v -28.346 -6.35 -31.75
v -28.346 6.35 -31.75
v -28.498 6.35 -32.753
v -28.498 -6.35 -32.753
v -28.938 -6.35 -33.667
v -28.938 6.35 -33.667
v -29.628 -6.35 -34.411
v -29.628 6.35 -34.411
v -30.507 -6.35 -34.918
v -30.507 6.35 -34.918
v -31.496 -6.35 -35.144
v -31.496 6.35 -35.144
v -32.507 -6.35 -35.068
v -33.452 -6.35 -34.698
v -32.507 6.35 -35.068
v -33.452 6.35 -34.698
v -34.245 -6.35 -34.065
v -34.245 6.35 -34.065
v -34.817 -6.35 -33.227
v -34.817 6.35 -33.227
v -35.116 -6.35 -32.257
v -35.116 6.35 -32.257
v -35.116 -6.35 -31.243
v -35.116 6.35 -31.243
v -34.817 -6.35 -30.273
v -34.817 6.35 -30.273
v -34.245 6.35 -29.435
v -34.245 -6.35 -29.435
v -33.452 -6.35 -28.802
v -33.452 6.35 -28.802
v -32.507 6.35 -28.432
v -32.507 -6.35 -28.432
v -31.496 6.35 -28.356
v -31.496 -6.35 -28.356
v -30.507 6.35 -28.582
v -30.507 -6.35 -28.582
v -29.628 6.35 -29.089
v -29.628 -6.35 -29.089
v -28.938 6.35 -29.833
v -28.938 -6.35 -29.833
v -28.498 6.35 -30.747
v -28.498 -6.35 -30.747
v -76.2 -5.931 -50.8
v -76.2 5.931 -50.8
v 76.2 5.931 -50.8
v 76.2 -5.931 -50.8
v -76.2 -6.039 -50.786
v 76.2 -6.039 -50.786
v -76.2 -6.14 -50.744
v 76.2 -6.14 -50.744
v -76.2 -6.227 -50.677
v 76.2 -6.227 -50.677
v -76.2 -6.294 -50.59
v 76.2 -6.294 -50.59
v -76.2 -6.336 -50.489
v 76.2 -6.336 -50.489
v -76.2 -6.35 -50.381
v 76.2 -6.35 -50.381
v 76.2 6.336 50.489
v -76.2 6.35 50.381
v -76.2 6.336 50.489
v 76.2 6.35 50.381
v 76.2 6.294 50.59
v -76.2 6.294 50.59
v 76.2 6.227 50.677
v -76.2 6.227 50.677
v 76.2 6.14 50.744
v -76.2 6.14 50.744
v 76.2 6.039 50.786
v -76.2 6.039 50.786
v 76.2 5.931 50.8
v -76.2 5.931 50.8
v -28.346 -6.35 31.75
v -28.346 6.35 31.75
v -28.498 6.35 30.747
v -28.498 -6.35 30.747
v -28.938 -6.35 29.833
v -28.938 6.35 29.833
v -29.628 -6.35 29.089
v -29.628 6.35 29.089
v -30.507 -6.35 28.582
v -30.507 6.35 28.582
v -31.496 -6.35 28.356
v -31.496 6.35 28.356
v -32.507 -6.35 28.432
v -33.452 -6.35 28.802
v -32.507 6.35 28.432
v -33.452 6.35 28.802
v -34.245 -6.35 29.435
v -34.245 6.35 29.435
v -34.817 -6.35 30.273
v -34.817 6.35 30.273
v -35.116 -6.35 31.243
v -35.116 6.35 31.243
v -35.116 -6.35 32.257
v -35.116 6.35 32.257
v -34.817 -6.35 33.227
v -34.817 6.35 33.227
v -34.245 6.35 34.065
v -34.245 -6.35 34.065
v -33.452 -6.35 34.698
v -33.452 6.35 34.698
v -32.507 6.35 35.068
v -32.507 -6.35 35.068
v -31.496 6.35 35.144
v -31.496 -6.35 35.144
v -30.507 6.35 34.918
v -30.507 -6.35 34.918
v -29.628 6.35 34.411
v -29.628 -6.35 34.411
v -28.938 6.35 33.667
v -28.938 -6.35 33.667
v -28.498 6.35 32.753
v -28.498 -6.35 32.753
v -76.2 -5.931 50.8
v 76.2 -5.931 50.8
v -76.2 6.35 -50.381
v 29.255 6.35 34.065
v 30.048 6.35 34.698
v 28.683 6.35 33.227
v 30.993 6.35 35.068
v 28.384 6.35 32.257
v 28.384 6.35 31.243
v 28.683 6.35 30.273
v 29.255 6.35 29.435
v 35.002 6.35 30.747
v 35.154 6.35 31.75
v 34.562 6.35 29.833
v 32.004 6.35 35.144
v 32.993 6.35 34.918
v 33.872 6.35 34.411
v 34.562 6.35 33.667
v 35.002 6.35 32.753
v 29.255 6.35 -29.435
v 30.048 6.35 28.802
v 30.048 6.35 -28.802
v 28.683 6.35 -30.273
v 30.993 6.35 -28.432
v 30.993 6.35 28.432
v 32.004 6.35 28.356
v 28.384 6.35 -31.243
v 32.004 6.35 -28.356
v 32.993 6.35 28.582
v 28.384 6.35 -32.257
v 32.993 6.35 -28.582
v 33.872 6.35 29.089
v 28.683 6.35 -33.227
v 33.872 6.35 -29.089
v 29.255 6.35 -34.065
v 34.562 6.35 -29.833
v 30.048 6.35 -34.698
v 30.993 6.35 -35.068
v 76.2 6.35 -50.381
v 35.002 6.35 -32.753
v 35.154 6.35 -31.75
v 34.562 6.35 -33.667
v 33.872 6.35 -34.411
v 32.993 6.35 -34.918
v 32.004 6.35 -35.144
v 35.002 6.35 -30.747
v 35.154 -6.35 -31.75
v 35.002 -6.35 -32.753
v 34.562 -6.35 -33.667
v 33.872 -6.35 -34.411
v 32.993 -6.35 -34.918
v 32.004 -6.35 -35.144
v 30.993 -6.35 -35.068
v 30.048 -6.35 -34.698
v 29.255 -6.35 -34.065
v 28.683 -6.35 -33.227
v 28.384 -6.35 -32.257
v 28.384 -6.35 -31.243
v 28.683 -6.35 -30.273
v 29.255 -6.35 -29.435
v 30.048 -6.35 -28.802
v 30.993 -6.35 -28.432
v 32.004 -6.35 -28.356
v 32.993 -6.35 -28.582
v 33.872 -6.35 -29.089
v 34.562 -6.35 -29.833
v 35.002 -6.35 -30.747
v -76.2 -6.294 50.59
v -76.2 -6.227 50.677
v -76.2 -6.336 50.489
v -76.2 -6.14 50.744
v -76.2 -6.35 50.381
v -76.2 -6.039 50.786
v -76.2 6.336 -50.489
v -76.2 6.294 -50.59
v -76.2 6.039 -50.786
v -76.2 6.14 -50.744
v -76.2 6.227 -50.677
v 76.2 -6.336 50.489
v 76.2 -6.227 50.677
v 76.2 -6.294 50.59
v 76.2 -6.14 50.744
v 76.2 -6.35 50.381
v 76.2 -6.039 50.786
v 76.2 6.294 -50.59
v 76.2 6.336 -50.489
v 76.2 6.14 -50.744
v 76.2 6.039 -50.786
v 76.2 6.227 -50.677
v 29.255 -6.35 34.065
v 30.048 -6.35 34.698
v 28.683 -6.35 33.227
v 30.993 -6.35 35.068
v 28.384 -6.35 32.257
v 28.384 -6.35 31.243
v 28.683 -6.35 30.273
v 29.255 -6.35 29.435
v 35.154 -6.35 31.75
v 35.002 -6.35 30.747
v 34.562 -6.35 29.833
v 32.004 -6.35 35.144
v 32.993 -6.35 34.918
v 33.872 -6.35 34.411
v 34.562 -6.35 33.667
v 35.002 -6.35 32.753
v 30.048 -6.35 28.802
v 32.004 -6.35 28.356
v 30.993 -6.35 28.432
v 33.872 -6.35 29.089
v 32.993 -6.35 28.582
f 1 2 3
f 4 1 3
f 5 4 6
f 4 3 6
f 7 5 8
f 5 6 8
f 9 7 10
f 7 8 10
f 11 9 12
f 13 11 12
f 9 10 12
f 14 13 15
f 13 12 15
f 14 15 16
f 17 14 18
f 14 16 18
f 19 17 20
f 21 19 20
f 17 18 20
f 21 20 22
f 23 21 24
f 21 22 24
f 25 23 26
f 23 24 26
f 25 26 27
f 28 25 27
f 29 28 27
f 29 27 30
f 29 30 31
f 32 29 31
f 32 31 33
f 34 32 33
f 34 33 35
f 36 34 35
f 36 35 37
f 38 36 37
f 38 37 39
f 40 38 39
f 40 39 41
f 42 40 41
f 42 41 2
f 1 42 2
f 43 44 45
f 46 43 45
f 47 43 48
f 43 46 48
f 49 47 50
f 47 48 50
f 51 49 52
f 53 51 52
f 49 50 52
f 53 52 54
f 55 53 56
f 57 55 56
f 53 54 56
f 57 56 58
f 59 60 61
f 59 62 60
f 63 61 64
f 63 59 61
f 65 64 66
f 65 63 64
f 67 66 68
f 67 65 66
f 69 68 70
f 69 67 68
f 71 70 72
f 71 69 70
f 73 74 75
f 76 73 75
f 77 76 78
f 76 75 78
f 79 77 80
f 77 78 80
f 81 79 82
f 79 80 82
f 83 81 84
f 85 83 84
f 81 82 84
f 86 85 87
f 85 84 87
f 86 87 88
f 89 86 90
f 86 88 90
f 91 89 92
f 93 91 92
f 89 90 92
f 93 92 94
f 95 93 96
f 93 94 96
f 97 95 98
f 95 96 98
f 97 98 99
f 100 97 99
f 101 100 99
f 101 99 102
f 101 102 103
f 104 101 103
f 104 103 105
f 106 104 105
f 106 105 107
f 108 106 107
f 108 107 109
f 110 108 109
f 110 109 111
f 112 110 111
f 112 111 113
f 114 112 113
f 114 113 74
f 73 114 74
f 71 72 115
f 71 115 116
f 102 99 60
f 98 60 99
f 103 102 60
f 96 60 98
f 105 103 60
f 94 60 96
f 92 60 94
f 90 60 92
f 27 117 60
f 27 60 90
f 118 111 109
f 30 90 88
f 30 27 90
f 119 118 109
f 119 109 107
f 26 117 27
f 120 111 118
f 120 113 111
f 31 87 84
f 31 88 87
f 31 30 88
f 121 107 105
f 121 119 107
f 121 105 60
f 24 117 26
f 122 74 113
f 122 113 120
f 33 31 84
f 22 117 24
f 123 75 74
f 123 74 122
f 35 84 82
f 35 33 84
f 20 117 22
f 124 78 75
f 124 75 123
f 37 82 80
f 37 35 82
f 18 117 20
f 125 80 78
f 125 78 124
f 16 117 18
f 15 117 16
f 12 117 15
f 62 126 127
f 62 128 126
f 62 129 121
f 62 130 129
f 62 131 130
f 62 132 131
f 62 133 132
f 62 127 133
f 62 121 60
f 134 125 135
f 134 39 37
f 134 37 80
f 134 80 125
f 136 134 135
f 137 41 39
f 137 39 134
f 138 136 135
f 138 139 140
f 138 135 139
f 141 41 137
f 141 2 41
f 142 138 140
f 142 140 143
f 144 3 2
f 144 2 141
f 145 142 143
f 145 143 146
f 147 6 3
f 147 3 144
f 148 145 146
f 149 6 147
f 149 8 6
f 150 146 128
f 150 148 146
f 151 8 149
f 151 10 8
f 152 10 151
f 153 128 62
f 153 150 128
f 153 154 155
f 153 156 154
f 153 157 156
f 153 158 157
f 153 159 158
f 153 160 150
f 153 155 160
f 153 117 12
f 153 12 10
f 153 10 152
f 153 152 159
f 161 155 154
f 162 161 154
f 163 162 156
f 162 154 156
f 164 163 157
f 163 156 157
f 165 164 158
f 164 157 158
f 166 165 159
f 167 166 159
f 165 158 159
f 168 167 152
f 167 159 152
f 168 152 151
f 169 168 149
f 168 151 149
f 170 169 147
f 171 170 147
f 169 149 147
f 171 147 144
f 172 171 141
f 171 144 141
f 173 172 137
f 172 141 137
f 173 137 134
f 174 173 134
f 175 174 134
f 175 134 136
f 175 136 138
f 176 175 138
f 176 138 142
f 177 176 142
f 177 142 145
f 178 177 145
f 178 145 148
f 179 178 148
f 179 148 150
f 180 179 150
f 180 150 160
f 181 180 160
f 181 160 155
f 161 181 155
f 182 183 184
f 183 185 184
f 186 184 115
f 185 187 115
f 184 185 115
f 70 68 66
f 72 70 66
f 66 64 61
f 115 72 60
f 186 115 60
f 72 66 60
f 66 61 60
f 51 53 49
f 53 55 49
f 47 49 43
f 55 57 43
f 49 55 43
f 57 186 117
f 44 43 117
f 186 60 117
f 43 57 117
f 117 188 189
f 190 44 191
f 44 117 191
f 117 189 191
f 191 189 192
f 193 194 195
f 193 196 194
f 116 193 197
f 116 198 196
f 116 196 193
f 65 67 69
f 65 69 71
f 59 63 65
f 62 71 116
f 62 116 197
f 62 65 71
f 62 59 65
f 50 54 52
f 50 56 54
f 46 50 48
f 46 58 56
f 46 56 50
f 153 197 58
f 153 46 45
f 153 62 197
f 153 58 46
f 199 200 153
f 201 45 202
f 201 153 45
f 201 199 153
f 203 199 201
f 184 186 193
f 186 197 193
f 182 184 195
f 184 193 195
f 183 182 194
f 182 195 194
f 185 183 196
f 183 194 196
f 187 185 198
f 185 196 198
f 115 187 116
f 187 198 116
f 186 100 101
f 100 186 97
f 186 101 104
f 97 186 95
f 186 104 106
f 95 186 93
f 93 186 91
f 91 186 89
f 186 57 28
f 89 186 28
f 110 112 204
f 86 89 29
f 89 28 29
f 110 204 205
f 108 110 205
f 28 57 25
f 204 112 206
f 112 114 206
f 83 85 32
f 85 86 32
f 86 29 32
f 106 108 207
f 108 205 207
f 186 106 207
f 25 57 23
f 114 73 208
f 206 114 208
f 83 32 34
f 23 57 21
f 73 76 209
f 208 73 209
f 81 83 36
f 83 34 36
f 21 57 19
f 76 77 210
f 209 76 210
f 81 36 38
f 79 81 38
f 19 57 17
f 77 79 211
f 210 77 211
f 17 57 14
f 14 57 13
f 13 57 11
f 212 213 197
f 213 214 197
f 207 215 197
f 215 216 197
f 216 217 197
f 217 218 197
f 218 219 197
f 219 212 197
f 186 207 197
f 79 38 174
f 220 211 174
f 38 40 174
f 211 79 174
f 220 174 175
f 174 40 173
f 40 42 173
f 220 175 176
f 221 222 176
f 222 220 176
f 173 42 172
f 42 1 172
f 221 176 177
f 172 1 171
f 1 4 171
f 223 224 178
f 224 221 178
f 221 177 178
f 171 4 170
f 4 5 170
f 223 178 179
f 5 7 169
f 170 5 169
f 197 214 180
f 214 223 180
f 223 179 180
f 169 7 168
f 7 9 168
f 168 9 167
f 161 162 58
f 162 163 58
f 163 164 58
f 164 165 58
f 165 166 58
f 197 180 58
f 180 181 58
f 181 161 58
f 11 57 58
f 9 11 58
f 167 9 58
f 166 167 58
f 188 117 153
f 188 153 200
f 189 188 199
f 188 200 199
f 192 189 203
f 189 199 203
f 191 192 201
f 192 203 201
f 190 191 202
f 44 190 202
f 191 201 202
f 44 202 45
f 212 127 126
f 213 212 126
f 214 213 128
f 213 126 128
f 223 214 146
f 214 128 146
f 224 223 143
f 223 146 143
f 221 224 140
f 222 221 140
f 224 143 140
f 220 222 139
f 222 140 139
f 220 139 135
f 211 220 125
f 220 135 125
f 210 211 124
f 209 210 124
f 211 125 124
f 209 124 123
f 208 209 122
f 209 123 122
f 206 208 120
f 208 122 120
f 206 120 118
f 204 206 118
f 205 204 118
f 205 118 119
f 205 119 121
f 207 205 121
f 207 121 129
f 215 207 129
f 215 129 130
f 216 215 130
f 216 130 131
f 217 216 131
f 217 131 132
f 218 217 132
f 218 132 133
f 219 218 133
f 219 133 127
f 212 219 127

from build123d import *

# Parameters (mm, degrees)
SKETCH3_W                = 152.4
SKETCH3_H                = 101.6
BOSS_EXTRUDE1_DEPTH      = 6.35
BOSS_EXTRUDE1_DEPTH_BACK = 6.35
FILLET1_R                = 0.4191
SKETCH5_R                = 3.4036
CUT_EXTRUDE2_DEPTH       = 13.7


with BuildPart() as part:
    # Sketch3 → Boss-Extrude1 (new body, two sides)
    with BuildSketch(Plane(origin=(0, 0, 0), x_dir=(1, 0, 0), z_dir=(0, 1, 0))) as boss_extrude1_sk:
        Rectangle(SKETCH3_W, SKETCH3_H)
    extrude(amount=BOSS_EXTRUDE1_DEPTH)
    extrude(boss_extrude1_sk.sketch, amount=-BOSS_EXTRUDE1_DEPTH_BACK)

    # Fillet1
    fillet1_edges = [part.edges().sort_by_distance(p)[0] for p in [
        (0, -6.35, -50.8),
        (0, -6.35, 50.8),
        (0, 6.35, -50.8),
        (0, 6.35, 50.8),
    ]]
    fillet(fillet1_edges, radius=FILLET1_R)

    # Sketch5 → Cut-Extrude2 (cut, through all)
    with BuildSketch(Plane(origin=(0, 6.35, 0), x_dir=(1, 0, 0), z_dir=(0, 1, 0))):
        with Locations((31.75, 31.75)):
            Circle(SKETCH5_R)
        with Locations((31.75, -31.75)):
            Circle(SKETCH5_R)
        with Locations((-31.75, -31.75)):
            Circle(SKETCH5_R)
        with Locations((-31.75, 31.75)):
            Circle(SKETCH5_R)
    extrude(amount=-CUT_EXTRUDE2_DEPTH, mode=Mode.SUBTRACT)


solid = part.part
